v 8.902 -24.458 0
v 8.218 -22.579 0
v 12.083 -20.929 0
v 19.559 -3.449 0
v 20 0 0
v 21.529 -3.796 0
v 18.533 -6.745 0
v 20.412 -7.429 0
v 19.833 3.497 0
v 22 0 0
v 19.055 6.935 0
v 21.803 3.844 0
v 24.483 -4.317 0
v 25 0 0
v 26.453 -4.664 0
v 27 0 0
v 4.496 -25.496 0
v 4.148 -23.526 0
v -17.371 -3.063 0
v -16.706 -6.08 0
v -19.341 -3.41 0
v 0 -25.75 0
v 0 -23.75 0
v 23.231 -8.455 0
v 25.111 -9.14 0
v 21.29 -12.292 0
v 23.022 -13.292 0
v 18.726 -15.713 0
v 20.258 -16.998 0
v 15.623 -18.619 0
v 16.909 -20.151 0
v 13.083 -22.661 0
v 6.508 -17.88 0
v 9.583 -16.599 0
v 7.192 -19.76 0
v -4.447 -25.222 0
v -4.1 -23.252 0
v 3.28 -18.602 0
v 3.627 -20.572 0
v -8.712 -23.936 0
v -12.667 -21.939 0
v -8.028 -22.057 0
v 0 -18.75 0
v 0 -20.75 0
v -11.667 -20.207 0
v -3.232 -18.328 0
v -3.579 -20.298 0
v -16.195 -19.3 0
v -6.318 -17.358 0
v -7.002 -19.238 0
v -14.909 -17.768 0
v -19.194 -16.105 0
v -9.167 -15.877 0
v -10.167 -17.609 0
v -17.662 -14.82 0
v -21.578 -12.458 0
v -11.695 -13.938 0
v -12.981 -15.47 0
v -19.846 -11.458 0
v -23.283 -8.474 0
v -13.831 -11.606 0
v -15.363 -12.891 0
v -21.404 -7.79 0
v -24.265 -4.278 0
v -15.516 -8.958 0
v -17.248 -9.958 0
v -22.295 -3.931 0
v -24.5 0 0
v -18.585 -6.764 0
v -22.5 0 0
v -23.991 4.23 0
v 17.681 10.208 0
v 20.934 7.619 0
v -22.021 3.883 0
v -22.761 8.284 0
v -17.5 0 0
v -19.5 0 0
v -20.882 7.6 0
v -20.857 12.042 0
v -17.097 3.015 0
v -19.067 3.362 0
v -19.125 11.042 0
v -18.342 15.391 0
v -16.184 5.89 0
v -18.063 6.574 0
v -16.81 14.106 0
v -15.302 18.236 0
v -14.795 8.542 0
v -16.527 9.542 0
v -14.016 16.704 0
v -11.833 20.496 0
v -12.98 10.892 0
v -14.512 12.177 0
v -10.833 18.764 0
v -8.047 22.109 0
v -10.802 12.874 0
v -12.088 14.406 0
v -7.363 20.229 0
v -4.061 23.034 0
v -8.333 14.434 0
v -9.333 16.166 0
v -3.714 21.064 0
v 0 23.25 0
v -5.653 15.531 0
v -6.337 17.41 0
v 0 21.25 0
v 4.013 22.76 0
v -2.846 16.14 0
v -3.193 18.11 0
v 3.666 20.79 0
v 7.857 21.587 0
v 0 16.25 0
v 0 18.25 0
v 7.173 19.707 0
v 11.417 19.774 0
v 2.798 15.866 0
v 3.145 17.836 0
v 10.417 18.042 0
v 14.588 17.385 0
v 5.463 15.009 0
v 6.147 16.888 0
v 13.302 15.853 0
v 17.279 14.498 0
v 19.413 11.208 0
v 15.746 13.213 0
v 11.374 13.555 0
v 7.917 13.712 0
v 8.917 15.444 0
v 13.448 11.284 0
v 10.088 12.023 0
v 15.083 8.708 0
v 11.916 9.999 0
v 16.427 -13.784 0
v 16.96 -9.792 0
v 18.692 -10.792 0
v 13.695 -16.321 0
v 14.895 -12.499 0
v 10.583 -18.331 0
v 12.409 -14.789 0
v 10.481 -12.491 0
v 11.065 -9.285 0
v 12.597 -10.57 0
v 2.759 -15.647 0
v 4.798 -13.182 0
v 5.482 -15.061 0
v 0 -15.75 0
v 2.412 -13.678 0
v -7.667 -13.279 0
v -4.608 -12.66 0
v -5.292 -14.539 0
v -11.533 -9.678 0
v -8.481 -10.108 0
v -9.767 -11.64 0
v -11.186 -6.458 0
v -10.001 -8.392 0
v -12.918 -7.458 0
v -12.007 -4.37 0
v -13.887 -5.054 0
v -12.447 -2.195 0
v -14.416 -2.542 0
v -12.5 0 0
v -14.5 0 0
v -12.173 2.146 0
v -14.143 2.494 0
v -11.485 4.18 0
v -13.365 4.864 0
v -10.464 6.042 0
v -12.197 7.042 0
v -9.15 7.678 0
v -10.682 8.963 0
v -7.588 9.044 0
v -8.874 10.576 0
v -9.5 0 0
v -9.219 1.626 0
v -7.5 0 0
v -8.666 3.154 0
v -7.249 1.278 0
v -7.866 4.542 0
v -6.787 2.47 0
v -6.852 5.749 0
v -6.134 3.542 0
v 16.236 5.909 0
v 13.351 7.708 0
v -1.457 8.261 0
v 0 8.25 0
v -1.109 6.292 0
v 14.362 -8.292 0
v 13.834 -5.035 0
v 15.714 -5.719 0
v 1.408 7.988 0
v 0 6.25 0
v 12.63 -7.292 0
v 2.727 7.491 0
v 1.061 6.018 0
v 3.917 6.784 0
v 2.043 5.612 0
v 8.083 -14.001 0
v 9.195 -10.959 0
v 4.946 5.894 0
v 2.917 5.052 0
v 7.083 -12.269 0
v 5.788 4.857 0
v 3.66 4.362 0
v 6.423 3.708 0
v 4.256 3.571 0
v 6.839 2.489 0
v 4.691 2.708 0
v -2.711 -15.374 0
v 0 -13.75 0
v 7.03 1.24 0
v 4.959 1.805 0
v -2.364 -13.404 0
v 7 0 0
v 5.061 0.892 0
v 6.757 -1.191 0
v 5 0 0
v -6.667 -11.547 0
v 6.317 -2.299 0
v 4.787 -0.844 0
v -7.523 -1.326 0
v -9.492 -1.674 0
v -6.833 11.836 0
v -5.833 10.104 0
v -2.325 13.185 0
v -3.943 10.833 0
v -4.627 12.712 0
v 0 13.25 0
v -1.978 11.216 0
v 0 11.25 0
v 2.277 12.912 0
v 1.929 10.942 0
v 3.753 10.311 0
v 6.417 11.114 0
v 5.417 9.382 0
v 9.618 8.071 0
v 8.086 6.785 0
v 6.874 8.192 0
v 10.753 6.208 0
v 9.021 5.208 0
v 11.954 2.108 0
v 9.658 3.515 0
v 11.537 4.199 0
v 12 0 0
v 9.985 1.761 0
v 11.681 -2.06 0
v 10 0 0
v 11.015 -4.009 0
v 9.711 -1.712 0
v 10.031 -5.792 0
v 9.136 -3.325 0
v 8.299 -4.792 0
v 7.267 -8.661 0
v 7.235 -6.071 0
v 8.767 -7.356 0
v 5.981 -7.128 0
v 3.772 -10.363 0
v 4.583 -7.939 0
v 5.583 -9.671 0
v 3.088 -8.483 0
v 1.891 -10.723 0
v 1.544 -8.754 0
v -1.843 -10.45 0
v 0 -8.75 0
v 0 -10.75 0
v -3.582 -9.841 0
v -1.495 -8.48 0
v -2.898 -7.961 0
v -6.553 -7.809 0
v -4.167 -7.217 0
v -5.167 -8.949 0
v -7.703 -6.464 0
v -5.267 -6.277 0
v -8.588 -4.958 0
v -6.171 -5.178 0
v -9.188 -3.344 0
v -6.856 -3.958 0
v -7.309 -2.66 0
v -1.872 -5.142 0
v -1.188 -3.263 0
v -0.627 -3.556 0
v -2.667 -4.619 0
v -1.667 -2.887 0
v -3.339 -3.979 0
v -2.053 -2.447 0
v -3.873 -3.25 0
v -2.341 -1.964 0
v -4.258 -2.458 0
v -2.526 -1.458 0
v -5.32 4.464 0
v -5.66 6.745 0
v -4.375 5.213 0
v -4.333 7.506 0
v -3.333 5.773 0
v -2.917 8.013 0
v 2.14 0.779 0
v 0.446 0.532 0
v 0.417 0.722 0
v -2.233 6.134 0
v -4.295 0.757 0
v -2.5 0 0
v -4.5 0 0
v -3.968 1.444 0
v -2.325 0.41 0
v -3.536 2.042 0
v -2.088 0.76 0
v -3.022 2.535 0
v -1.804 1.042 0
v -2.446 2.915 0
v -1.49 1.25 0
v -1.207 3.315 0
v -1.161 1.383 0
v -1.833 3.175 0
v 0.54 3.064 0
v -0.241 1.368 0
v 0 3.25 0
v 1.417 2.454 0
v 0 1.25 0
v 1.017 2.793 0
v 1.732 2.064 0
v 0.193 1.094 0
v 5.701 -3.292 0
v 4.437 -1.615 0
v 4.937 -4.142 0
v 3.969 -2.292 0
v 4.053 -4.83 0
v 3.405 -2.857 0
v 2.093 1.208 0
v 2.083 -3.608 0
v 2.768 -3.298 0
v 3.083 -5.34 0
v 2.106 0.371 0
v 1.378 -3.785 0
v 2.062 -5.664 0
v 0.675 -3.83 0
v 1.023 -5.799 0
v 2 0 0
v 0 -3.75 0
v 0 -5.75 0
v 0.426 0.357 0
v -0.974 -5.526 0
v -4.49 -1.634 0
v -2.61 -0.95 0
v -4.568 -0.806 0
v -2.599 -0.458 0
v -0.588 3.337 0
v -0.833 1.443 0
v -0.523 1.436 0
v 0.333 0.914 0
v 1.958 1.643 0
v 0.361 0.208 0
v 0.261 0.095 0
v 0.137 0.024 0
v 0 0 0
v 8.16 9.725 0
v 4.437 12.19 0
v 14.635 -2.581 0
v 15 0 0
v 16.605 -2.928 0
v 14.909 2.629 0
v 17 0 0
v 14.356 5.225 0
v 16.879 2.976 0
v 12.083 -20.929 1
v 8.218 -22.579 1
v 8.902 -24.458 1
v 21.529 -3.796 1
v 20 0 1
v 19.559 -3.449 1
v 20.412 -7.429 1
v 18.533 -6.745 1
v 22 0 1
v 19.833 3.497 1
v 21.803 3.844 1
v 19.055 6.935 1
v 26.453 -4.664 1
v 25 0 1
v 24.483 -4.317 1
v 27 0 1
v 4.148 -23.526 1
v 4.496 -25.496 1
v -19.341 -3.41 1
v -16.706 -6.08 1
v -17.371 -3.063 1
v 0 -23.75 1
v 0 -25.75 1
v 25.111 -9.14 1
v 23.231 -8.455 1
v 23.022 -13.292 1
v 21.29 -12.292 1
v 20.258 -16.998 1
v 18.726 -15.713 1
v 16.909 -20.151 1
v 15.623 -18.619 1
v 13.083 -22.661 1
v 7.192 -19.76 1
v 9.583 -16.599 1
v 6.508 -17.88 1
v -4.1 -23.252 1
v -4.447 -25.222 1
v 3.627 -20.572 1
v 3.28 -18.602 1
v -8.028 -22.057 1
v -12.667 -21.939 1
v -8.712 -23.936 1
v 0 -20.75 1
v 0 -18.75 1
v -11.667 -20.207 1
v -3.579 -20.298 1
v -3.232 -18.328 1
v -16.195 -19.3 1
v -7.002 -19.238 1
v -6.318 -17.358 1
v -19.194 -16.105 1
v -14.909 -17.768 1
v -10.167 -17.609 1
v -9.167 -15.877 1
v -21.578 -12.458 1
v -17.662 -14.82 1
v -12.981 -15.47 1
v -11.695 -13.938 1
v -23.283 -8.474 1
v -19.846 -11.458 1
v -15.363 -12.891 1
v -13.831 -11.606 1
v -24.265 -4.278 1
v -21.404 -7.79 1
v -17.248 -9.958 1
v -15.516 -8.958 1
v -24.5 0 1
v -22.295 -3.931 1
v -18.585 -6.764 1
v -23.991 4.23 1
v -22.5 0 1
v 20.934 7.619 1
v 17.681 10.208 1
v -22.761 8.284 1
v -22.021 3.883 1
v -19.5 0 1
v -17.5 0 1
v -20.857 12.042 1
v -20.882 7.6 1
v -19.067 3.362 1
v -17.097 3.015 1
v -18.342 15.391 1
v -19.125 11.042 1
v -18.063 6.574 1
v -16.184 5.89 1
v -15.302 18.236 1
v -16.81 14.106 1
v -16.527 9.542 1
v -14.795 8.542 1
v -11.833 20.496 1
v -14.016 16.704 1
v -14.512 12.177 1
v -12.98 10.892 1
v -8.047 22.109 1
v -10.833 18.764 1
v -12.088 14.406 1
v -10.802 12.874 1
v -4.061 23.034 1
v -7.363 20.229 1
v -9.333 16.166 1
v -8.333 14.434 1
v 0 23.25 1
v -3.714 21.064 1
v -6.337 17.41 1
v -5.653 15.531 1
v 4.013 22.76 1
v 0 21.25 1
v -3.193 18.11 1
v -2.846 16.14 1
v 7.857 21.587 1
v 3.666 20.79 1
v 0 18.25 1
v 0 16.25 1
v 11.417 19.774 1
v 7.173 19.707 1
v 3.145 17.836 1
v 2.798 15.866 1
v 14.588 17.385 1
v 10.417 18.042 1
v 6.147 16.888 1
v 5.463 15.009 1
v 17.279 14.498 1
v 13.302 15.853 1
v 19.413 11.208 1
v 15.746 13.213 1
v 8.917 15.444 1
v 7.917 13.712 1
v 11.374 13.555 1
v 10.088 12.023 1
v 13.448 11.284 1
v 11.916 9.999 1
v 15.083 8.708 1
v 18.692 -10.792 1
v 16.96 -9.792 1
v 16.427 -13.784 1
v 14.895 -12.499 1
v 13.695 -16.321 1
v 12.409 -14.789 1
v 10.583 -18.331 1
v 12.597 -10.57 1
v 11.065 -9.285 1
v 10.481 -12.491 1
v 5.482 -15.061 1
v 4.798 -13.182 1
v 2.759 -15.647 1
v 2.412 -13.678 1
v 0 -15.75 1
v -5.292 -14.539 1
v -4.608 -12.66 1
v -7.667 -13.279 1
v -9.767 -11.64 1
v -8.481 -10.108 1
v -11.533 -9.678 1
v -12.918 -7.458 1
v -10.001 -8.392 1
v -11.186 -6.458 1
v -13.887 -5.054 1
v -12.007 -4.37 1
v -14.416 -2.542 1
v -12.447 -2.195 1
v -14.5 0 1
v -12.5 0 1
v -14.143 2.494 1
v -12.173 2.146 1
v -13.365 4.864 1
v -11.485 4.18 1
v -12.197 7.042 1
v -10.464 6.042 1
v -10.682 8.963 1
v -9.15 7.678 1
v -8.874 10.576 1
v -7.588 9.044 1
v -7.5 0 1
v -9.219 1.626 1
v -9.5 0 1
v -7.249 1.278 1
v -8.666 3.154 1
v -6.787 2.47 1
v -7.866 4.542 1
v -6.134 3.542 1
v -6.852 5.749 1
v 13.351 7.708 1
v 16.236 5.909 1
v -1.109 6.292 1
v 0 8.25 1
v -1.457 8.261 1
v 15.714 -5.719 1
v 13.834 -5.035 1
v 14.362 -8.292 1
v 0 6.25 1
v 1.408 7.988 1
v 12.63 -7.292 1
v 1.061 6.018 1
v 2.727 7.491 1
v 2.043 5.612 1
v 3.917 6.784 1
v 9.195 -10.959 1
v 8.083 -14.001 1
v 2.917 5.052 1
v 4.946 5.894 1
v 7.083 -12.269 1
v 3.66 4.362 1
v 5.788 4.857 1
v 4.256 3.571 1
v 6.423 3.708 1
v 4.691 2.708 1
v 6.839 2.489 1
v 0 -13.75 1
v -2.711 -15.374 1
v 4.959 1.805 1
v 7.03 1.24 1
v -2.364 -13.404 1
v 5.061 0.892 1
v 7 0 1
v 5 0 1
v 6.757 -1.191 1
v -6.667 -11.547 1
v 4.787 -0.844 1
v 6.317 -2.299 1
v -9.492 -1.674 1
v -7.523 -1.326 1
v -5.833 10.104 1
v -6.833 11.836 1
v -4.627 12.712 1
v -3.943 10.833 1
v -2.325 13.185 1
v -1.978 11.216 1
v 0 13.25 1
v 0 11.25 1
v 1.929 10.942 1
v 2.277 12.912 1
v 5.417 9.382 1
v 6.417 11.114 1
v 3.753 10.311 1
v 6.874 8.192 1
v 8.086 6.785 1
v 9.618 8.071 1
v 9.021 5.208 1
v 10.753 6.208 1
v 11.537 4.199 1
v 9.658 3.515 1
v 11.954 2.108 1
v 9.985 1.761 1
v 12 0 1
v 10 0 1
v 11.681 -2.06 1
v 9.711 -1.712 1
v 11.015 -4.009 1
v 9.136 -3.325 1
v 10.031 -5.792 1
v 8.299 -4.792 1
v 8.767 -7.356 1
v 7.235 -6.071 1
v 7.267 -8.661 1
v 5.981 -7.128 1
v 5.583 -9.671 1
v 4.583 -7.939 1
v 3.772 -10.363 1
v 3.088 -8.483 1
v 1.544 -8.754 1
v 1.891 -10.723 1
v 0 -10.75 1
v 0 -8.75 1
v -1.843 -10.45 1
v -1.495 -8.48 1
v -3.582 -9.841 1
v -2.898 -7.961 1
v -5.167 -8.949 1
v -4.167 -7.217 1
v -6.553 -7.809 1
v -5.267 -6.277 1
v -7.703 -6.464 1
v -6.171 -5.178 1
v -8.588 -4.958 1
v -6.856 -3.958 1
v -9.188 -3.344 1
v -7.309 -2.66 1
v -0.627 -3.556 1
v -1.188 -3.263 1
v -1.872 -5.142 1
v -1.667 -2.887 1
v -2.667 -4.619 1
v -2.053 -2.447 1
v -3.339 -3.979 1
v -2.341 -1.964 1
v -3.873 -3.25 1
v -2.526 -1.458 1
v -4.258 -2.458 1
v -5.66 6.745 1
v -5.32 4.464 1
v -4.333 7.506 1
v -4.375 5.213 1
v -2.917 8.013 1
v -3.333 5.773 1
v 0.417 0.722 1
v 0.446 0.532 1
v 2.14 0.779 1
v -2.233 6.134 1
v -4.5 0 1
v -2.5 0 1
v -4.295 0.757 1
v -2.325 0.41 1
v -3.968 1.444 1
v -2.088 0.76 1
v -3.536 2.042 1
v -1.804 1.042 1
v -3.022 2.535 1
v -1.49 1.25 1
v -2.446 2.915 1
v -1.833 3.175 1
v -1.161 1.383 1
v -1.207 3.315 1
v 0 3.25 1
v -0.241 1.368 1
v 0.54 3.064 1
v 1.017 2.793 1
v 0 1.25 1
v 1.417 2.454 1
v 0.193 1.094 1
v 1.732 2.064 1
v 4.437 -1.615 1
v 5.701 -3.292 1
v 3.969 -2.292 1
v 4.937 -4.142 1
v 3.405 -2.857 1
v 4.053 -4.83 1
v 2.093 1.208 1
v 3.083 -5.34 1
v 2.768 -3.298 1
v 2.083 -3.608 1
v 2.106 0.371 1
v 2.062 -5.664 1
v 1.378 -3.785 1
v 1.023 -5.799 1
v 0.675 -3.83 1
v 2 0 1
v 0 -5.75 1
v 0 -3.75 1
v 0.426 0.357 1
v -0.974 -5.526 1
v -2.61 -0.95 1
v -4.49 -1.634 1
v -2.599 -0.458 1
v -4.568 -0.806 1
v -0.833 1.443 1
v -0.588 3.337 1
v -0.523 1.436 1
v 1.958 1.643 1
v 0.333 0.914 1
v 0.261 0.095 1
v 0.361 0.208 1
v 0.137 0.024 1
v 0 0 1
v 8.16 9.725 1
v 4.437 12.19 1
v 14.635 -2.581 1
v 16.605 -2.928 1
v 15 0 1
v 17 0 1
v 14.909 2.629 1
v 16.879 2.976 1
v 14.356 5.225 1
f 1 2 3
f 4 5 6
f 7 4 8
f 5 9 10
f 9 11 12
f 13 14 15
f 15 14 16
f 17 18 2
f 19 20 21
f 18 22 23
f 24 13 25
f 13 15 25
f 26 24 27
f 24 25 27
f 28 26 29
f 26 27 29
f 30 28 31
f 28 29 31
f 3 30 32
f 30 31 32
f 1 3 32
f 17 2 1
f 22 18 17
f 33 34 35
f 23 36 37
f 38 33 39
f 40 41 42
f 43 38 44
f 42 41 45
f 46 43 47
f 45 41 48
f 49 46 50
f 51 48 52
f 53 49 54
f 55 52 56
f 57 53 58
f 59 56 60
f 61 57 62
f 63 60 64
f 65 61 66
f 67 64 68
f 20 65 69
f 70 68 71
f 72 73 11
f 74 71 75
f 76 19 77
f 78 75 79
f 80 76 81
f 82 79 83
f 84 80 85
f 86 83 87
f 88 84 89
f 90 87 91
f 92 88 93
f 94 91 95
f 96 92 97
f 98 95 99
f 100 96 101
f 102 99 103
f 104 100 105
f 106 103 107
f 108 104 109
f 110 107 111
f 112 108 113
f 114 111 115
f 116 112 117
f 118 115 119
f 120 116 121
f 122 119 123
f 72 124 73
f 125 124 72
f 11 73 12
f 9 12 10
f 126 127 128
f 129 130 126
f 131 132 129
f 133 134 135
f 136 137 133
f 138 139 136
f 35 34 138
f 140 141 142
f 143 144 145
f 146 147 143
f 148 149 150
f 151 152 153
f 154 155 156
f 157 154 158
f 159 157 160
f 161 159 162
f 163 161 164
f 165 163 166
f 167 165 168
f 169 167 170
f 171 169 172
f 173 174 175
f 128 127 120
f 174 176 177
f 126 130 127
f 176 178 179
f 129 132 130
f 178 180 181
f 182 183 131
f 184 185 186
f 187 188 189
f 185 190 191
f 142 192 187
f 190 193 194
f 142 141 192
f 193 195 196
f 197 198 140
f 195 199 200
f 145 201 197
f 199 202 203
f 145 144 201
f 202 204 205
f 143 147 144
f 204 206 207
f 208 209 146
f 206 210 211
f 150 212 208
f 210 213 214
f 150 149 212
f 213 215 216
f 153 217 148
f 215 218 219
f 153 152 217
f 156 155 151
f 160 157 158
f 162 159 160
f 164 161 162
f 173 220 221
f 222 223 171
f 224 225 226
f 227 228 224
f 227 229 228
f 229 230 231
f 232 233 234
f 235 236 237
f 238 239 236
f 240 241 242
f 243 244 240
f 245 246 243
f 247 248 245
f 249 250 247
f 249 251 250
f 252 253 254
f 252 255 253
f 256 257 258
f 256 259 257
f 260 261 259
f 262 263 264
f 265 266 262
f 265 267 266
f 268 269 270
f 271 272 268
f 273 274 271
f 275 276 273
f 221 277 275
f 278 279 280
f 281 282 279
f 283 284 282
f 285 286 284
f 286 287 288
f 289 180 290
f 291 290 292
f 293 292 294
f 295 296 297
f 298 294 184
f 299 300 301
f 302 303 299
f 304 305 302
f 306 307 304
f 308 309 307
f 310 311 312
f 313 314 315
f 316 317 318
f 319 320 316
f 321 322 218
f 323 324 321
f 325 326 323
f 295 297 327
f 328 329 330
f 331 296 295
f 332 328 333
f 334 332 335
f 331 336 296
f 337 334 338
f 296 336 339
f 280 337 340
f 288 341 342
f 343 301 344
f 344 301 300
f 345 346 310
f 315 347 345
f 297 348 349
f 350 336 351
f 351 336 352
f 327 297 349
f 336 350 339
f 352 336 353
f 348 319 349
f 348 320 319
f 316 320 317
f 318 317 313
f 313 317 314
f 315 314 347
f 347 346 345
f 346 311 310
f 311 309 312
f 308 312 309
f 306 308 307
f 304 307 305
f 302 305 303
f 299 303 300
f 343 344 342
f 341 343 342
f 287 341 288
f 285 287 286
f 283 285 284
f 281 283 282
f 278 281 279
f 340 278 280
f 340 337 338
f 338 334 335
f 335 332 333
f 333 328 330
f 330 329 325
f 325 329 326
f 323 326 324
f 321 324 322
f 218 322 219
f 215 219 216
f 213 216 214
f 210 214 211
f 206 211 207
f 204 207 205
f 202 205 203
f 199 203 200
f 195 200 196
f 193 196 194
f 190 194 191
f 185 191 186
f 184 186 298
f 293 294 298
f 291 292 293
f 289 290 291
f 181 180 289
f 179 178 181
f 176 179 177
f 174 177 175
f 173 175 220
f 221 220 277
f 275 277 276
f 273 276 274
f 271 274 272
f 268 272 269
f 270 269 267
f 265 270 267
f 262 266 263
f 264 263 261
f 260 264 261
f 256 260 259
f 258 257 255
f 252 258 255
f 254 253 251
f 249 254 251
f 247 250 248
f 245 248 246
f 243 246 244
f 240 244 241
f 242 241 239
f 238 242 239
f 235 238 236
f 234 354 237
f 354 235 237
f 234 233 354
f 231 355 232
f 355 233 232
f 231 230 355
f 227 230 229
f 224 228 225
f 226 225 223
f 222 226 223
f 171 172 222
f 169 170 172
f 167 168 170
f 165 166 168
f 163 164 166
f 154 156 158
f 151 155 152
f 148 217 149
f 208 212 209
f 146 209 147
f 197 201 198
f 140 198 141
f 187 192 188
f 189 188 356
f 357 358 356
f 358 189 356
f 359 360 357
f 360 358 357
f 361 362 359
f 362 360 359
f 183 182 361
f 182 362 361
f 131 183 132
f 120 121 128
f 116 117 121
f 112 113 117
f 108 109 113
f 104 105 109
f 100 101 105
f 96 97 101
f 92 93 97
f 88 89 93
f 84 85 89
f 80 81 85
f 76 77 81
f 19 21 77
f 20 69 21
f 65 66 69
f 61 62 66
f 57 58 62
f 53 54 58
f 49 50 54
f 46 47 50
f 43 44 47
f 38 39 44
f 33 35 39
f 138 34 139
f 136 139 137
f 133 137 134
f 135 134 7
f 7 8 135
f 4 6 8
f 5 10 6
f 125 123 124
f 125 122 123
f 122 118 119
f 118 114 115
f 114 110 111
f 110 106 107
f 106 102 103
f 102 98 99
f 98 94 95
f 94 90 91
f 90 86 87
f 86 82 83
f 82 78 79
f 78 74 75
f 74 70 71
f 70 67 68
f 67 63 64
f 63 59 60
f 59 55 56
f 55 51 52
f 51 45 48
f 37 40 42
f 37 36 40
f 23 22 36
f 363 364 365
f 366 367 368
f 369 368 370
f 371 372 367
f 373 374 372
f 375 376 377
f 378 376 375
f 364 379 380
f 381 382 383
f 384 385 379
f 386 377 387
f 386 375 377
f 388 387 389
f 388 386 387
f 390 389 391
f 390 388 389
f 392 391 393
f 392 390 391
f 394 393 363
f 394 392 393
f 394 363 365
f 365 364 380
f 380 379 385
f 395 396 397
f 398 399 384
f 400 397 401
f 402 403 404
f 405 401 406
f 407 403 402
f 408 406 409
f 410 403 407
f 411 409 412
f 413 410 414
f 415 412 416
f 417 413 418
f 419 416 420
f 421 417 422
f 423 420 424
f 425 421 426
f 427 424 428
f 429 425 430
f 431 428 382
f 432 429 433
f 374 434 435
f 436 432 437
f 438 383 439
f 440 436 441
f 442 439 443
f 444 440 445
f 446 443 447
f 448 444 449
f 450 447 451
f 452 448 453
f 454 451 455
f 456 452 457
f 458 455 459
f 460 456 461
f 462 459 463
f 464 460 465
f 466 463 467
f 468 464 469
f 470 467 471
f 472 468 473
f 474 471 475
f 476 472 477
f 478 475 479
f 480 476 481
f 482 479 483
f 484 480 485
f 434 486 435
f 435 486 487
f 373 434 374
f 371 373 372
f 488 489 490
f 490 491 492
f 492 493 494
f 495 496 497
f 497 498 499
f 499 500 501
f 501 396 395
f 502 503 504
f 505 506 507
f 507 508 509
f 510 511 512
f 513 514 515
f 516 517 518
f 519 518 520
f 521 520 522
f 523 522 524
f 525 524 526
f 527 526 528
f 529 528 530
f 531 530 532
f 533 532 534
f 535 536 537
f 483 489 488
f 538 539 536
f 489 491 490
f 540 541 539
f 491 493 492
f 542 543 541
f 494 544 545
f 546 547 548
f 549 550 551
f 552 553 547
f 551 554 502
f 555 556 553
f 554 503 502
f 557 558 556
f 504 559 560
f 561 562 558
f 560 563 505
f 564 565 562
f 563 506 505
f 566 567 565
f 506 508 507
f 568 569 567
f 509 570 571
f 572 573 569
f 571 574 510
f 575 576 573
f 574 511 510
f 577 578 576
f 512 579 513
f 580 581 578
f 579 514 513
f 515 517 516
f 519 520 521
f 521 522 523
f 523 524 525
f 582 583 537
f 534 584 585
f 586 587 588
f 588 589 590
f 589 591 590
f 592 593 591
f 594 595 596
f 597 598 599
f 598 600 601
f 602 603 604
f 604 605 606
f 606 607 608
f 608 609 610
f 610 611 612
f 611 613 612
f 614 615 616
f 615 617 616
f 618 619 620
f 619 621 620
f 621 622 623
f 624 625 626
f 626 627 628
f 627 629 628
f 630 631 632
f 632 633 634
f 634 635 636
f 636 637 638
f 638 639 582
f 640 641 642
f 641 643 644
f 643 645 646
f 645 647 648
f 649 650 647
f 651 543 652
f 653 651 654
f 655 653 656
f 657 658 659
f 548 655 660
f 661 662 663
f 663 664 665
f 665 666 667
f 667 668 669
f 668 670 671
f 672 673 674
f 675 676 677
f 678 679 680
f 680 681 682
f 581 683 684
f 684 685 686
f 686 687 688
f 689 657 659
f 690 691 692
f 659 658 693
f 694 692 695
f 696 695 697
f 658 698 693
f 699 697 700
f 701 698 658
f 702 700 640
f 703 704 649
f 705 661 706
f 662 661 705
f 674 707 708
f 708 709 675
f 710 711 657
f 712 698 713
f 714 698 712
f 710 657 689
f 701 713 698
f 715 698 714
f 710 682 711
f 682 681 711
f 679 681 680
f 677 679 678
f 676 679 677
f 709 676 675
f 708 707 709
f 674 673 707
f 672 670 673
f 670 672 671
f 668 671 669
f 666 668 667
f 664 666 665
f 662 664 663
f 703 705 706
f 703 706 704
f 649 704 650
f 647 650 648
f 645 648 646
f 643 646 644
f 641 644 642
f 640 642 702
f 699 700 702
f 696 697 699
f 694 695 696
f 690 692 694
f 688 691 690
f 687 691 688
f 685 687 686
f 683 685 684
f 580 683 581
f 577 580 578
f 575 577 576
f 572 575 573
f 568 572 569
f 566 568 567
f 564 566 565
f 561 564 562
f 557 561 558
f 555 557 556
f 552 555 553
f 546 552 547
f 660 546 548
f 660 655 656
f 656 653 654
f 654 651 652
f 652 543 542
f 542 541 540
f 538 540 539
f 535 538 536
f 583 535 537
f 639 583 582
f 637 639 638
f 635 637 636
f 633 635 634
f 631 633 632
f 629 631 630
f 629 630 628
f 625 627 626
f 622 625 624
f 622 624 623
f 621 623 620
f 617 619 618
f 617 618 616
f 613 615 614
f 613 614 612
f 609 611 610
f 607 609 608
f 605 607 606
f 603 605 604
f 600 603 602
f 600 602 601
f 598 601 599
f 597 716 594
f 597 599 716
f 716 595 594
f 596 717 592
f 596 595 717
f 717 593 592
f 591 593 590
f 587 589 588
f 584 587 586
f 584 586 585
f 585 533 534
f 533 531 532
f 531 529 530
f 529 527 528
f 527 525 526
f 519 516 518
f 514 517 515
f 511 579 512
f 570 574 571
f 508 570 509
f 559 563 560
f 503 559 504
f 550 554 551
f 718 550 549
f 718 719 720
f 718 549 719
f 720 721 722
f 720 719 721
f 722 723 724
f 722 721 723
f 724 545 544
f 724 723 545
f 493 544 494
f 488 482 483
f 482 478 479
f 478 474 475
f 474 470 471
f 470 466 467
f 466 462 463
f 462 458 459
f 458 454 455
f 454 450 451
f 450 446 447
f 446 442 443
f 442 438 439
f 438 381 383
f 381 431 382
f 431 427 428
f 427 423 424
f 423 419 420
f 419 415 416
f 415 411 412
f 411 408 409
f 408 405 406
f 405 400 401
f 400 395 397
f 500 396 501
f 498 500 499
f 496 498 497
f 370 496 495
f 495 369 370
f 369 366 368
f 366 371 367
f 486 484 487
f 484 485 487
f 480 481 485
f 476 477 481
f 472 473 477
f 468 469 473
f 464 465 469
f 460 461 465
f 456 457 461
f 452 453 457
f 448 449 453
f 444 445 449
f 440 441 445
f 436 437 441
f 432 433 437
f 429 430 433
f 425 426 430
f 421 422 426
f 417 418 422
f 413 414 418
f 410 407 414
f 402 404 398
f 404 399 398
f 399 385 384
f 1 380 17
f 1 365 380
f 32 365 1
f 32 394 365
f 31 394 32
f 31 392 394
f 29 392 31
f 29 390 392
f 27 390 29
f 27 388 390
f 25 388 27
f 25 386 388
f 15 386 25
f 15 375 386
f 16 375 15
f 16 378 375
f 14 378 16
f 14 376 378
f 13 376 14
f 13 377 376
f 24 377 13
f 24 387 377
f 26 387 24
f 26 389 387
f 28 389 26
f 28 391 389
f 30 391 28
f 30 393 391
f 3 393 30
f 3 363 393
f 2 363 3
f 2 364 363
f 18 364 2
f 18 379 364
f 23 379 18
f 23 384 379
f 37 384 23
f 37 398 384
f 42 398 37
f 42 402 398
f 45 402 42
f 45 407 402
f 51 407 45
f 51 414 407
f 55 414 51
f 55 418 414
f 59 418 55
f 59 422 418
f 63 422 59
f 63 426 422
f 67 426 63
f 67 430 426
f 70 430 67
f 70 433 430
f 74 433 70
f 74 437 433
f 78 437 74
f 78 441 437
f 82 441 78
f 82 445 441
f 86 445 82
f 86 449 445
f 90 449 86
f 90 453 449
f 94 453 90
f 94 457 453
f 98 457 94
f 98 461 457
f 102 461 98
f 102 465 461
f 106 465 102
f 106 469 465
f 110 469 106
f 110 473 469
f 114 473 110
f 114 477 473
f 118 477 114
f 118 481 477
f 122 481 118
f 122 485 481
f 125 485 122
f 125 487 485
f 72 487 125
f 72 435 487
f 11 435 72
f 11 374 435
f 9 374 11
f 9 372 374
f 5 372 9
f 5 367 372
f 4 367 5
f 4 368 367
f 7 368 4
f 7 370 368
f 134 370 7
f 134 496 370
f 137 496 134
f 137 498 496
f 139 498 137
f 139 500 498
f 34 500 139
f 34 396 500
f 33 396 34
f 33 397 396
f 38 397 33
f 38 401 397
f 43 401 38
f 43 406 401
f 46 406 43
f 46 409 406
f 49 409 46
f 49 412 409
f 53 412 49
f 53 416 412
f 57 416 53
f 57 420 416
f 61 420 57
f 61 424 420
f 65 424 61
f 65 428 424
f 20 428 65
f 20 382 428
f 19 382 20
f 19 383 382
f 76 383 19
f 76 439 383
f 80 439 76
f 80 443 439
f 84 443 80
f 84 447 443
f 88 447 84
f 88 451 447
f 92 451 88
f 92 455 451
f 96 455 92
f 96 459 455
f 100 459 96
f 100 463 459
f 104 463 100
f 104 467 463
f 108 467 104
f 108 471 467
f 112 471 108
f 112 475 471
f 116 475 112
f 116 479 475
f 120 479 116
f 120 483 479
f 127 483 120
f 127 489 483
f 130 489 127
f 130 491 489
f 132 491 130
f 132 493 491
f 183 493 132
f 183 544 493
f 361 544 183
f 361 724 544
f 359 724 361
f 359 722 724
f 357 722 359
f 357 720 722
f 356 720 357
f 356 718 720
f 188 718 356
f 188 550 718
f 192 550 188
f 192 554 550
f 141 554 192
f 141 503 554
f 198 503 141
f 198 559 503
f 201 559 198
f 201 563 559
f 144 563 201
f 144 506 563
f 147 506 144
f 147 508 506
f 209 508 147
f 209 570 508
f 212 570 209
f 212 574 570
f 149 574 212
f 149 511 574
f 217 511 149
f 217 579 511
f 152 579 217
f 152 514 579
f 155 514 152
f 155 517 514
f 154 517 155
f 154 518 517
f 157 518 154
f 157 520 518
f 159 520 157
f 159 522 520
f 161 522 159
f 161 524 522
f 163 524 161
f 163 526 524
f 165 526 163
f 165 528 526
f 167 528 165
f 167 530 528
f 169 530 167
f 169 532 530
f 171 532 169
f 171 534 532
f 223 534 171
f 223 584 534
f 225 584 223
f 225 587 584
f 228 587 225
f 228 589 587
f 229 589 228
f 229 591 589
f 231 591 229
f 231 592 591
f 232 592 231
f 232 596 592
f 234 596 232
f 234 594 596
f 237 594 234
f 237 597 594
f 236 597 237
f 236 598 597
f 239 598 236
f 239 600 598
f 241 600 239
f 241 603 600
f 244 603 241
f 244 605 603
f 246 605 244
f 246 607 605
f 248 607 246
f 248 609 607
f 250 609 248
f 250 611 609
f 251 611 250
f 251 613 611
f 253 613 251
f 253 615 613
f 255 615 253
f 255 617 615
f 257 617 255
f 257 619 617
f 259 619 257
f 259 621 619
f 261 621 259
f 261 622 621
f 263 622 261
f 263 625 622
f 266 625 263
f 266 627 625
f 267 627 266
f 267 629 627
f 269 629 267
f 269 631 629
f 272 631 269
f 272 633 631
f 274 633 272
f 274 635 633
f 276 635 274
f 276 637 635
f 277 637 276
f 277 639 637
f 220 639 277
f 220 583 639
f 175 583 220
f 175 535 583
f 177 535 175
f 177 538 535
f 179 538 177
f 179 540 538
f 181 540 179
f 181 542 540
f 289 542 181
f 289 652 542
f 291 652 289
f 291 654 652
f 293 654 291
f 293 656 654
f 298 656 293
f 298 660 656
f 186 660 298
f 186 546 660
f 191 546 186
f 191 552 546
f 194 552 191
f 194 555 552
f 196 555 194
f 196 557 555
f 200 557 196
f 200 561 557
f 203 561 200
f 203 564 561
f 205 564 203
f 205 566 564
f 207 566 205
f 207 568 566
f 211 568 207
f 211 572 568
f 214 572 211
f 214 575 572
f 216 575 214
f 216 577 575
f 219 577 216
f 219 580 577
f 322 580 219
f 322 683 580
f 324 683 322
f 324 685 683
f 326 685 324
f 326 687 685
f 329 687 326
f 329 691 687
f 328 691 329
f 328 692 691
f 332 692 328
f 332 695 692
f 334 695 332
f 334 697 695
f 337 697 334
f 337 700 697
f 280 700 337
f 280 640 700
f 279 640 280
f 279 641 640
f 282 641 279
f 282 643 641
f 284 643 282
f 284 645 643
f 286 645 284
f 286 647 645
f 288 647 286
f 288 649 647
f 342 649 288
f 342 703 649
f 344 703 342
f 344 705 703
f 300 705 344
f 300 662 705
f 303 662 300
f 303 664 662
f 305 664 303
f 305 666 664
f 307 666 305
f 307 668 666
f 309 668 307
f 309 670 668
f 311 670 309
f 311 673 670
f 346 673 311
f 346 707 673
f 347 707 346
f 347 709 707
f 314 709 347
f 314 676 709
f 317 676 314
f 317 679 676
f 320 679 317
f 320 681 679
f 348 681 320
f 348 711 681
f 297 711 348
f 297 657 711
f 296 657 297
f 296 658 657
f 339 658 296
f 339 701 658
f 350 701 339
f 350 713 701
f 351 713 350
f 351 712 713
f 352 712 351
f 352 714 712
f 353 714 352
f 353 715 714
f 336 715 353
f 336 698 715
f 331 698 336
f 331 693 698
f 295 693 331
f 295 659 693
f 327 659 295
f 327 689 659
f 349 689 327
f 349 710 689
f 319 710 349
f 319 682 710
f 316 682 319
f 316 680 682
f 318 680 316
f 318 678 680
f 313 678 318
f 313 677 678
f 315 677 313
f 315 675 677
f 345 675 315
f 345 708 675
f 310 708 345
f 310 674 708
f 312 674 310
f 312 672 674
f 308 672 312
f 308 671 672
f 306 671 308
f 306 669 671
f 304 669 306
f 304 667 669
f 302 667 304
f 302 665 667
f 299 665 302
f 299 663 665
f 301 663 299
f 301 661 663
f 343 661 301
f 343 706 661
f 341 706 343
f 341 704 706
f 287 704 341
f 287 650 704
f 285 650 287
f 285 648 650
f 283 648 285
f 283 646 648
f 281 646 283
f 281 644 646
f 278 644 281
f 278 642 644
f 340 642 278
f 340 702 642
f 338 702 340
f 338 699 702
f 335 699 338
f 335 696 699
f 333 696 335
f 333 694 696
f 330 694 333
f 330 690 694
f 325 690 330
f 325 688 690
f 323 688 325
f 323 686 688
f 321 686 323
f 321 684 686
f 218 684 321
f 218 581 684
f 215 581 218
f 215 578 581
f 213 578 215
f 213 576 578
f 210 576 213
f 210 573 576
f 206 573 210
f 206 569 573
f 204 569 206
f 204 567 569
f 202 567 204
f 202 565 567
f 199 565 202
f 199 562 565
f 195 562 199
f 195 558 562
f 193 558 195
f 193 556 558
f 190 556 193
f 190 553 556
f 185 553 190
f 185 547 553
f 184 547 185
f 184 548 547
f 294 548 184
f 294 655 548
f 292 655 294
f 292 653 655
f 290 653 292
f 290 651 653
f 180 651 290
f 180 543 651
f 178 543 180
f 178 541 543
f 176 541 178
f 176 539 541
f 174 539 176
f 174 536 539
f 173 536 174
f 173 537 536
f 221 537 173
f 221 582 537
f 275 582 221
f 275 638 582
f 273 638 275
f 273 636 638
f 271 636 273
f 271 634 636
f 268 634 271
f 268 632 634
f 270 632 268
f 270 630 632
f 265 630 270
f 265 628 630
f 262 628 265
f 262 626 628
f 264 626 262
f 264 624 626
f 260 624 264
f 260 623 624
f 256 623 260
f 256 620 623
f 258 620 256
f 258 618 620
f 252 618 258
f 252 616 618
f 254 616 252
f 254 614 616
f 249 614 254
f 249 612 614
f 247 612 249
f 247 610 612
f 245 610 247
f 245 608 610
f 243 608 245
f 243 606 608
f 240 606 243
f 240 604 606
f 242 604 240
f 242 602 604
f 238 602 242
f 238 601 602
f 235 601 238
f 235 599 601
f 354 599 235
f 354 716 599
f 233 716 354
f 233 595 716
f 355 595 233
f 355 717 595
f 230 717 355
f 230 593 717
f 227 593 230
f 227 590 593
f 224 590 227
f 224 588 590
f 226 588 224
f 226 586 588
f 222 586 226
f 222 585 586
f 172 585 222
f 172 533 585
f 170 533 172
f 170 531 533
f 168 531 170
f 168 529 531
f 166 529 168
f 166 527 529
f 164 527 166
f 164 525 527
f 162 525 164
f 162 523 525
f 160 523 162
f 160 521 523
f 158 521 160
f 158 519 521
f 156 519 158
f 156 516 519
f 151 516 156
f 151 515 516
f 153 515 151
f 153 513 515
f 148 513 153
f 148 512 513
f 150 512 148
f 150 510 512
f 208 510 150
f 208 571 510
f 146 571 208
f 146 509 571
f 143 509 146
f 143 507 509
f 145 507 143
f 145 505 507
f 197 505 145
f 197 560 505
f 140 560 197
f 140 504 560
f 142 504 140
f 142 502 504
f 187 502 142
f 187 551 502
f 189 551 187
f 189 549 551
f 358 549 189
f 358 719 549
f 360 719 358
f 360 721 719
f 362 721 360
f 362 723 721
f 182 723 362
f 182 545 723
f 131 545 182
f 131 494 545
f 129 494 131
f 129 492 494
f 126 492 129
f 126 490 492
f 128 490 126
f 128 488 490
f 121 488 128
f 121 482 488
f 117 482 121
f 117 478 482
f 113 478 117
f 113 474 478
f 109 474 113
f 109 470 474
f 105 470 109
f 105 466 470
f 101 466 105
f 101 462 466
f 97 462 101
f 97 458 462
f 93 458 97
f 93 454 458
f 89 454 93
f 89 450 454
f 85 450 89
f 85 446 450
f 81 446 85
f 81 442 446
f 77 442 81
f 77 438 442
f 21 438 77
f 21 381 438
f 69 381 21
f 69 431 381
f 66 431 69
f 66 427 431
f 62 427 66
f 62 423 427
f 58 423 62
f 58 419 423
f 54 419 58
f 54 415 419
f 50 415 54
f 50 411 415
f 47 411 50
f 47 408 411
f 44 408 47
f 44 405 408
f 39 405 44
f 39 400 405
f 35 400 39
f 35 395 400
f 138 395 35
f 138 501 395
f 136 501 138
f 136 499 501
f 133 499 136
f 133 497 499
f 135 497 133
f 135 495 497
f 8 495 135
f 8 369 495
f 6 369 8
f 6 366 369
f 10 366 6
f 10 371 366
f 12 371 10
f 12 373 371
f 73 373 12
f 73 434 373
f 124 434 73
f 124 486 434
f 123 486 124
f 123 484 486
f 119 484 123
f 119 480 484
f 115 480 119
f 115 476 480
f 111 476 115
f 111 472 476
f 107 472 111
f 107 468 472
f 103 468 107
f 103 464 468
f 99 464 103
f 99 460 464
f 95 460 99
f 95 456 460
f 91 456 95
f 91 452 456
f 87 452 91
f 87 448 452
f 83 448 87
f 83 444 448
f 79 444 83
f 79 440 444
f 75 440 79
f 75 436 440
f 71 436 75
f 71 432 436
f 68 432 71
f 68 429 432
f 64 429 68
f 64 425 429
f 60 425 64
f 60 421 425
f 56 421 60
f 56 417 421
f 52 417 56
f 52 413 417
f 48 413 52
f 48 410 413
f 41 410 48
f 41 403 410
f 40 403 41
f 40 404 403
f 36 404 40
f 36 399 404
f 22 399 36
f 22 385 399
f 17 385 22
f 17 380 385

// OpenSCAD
// Parameters
loops = 5;          // Number of full rotations
thickness = 2;      // Thickness of the spiral "line"
spacing = 5;        // Distance between each turn
step_size = 10;     // Degrees per segment (lower is smoother)

// Generate the flat spiral polygon
linear_extrude(height = 1) // Give it a tiny bit of height for visibility
polygon(points = concat(
    // Outer edge points
    [for (a = [0 : step_size : 360 * loops]) 
        let (r = (a / 360) * spacing + thickness) 
        [r * cos(a), r * sin(a)]],
    // Inner edge points (backwards to close the polygon)
    [for (a = [360 * loops : -step_size : 0]) 
        let (r = (a / 360) * spacing) 
        [r * cos(a), r * sin(a)]]
));
